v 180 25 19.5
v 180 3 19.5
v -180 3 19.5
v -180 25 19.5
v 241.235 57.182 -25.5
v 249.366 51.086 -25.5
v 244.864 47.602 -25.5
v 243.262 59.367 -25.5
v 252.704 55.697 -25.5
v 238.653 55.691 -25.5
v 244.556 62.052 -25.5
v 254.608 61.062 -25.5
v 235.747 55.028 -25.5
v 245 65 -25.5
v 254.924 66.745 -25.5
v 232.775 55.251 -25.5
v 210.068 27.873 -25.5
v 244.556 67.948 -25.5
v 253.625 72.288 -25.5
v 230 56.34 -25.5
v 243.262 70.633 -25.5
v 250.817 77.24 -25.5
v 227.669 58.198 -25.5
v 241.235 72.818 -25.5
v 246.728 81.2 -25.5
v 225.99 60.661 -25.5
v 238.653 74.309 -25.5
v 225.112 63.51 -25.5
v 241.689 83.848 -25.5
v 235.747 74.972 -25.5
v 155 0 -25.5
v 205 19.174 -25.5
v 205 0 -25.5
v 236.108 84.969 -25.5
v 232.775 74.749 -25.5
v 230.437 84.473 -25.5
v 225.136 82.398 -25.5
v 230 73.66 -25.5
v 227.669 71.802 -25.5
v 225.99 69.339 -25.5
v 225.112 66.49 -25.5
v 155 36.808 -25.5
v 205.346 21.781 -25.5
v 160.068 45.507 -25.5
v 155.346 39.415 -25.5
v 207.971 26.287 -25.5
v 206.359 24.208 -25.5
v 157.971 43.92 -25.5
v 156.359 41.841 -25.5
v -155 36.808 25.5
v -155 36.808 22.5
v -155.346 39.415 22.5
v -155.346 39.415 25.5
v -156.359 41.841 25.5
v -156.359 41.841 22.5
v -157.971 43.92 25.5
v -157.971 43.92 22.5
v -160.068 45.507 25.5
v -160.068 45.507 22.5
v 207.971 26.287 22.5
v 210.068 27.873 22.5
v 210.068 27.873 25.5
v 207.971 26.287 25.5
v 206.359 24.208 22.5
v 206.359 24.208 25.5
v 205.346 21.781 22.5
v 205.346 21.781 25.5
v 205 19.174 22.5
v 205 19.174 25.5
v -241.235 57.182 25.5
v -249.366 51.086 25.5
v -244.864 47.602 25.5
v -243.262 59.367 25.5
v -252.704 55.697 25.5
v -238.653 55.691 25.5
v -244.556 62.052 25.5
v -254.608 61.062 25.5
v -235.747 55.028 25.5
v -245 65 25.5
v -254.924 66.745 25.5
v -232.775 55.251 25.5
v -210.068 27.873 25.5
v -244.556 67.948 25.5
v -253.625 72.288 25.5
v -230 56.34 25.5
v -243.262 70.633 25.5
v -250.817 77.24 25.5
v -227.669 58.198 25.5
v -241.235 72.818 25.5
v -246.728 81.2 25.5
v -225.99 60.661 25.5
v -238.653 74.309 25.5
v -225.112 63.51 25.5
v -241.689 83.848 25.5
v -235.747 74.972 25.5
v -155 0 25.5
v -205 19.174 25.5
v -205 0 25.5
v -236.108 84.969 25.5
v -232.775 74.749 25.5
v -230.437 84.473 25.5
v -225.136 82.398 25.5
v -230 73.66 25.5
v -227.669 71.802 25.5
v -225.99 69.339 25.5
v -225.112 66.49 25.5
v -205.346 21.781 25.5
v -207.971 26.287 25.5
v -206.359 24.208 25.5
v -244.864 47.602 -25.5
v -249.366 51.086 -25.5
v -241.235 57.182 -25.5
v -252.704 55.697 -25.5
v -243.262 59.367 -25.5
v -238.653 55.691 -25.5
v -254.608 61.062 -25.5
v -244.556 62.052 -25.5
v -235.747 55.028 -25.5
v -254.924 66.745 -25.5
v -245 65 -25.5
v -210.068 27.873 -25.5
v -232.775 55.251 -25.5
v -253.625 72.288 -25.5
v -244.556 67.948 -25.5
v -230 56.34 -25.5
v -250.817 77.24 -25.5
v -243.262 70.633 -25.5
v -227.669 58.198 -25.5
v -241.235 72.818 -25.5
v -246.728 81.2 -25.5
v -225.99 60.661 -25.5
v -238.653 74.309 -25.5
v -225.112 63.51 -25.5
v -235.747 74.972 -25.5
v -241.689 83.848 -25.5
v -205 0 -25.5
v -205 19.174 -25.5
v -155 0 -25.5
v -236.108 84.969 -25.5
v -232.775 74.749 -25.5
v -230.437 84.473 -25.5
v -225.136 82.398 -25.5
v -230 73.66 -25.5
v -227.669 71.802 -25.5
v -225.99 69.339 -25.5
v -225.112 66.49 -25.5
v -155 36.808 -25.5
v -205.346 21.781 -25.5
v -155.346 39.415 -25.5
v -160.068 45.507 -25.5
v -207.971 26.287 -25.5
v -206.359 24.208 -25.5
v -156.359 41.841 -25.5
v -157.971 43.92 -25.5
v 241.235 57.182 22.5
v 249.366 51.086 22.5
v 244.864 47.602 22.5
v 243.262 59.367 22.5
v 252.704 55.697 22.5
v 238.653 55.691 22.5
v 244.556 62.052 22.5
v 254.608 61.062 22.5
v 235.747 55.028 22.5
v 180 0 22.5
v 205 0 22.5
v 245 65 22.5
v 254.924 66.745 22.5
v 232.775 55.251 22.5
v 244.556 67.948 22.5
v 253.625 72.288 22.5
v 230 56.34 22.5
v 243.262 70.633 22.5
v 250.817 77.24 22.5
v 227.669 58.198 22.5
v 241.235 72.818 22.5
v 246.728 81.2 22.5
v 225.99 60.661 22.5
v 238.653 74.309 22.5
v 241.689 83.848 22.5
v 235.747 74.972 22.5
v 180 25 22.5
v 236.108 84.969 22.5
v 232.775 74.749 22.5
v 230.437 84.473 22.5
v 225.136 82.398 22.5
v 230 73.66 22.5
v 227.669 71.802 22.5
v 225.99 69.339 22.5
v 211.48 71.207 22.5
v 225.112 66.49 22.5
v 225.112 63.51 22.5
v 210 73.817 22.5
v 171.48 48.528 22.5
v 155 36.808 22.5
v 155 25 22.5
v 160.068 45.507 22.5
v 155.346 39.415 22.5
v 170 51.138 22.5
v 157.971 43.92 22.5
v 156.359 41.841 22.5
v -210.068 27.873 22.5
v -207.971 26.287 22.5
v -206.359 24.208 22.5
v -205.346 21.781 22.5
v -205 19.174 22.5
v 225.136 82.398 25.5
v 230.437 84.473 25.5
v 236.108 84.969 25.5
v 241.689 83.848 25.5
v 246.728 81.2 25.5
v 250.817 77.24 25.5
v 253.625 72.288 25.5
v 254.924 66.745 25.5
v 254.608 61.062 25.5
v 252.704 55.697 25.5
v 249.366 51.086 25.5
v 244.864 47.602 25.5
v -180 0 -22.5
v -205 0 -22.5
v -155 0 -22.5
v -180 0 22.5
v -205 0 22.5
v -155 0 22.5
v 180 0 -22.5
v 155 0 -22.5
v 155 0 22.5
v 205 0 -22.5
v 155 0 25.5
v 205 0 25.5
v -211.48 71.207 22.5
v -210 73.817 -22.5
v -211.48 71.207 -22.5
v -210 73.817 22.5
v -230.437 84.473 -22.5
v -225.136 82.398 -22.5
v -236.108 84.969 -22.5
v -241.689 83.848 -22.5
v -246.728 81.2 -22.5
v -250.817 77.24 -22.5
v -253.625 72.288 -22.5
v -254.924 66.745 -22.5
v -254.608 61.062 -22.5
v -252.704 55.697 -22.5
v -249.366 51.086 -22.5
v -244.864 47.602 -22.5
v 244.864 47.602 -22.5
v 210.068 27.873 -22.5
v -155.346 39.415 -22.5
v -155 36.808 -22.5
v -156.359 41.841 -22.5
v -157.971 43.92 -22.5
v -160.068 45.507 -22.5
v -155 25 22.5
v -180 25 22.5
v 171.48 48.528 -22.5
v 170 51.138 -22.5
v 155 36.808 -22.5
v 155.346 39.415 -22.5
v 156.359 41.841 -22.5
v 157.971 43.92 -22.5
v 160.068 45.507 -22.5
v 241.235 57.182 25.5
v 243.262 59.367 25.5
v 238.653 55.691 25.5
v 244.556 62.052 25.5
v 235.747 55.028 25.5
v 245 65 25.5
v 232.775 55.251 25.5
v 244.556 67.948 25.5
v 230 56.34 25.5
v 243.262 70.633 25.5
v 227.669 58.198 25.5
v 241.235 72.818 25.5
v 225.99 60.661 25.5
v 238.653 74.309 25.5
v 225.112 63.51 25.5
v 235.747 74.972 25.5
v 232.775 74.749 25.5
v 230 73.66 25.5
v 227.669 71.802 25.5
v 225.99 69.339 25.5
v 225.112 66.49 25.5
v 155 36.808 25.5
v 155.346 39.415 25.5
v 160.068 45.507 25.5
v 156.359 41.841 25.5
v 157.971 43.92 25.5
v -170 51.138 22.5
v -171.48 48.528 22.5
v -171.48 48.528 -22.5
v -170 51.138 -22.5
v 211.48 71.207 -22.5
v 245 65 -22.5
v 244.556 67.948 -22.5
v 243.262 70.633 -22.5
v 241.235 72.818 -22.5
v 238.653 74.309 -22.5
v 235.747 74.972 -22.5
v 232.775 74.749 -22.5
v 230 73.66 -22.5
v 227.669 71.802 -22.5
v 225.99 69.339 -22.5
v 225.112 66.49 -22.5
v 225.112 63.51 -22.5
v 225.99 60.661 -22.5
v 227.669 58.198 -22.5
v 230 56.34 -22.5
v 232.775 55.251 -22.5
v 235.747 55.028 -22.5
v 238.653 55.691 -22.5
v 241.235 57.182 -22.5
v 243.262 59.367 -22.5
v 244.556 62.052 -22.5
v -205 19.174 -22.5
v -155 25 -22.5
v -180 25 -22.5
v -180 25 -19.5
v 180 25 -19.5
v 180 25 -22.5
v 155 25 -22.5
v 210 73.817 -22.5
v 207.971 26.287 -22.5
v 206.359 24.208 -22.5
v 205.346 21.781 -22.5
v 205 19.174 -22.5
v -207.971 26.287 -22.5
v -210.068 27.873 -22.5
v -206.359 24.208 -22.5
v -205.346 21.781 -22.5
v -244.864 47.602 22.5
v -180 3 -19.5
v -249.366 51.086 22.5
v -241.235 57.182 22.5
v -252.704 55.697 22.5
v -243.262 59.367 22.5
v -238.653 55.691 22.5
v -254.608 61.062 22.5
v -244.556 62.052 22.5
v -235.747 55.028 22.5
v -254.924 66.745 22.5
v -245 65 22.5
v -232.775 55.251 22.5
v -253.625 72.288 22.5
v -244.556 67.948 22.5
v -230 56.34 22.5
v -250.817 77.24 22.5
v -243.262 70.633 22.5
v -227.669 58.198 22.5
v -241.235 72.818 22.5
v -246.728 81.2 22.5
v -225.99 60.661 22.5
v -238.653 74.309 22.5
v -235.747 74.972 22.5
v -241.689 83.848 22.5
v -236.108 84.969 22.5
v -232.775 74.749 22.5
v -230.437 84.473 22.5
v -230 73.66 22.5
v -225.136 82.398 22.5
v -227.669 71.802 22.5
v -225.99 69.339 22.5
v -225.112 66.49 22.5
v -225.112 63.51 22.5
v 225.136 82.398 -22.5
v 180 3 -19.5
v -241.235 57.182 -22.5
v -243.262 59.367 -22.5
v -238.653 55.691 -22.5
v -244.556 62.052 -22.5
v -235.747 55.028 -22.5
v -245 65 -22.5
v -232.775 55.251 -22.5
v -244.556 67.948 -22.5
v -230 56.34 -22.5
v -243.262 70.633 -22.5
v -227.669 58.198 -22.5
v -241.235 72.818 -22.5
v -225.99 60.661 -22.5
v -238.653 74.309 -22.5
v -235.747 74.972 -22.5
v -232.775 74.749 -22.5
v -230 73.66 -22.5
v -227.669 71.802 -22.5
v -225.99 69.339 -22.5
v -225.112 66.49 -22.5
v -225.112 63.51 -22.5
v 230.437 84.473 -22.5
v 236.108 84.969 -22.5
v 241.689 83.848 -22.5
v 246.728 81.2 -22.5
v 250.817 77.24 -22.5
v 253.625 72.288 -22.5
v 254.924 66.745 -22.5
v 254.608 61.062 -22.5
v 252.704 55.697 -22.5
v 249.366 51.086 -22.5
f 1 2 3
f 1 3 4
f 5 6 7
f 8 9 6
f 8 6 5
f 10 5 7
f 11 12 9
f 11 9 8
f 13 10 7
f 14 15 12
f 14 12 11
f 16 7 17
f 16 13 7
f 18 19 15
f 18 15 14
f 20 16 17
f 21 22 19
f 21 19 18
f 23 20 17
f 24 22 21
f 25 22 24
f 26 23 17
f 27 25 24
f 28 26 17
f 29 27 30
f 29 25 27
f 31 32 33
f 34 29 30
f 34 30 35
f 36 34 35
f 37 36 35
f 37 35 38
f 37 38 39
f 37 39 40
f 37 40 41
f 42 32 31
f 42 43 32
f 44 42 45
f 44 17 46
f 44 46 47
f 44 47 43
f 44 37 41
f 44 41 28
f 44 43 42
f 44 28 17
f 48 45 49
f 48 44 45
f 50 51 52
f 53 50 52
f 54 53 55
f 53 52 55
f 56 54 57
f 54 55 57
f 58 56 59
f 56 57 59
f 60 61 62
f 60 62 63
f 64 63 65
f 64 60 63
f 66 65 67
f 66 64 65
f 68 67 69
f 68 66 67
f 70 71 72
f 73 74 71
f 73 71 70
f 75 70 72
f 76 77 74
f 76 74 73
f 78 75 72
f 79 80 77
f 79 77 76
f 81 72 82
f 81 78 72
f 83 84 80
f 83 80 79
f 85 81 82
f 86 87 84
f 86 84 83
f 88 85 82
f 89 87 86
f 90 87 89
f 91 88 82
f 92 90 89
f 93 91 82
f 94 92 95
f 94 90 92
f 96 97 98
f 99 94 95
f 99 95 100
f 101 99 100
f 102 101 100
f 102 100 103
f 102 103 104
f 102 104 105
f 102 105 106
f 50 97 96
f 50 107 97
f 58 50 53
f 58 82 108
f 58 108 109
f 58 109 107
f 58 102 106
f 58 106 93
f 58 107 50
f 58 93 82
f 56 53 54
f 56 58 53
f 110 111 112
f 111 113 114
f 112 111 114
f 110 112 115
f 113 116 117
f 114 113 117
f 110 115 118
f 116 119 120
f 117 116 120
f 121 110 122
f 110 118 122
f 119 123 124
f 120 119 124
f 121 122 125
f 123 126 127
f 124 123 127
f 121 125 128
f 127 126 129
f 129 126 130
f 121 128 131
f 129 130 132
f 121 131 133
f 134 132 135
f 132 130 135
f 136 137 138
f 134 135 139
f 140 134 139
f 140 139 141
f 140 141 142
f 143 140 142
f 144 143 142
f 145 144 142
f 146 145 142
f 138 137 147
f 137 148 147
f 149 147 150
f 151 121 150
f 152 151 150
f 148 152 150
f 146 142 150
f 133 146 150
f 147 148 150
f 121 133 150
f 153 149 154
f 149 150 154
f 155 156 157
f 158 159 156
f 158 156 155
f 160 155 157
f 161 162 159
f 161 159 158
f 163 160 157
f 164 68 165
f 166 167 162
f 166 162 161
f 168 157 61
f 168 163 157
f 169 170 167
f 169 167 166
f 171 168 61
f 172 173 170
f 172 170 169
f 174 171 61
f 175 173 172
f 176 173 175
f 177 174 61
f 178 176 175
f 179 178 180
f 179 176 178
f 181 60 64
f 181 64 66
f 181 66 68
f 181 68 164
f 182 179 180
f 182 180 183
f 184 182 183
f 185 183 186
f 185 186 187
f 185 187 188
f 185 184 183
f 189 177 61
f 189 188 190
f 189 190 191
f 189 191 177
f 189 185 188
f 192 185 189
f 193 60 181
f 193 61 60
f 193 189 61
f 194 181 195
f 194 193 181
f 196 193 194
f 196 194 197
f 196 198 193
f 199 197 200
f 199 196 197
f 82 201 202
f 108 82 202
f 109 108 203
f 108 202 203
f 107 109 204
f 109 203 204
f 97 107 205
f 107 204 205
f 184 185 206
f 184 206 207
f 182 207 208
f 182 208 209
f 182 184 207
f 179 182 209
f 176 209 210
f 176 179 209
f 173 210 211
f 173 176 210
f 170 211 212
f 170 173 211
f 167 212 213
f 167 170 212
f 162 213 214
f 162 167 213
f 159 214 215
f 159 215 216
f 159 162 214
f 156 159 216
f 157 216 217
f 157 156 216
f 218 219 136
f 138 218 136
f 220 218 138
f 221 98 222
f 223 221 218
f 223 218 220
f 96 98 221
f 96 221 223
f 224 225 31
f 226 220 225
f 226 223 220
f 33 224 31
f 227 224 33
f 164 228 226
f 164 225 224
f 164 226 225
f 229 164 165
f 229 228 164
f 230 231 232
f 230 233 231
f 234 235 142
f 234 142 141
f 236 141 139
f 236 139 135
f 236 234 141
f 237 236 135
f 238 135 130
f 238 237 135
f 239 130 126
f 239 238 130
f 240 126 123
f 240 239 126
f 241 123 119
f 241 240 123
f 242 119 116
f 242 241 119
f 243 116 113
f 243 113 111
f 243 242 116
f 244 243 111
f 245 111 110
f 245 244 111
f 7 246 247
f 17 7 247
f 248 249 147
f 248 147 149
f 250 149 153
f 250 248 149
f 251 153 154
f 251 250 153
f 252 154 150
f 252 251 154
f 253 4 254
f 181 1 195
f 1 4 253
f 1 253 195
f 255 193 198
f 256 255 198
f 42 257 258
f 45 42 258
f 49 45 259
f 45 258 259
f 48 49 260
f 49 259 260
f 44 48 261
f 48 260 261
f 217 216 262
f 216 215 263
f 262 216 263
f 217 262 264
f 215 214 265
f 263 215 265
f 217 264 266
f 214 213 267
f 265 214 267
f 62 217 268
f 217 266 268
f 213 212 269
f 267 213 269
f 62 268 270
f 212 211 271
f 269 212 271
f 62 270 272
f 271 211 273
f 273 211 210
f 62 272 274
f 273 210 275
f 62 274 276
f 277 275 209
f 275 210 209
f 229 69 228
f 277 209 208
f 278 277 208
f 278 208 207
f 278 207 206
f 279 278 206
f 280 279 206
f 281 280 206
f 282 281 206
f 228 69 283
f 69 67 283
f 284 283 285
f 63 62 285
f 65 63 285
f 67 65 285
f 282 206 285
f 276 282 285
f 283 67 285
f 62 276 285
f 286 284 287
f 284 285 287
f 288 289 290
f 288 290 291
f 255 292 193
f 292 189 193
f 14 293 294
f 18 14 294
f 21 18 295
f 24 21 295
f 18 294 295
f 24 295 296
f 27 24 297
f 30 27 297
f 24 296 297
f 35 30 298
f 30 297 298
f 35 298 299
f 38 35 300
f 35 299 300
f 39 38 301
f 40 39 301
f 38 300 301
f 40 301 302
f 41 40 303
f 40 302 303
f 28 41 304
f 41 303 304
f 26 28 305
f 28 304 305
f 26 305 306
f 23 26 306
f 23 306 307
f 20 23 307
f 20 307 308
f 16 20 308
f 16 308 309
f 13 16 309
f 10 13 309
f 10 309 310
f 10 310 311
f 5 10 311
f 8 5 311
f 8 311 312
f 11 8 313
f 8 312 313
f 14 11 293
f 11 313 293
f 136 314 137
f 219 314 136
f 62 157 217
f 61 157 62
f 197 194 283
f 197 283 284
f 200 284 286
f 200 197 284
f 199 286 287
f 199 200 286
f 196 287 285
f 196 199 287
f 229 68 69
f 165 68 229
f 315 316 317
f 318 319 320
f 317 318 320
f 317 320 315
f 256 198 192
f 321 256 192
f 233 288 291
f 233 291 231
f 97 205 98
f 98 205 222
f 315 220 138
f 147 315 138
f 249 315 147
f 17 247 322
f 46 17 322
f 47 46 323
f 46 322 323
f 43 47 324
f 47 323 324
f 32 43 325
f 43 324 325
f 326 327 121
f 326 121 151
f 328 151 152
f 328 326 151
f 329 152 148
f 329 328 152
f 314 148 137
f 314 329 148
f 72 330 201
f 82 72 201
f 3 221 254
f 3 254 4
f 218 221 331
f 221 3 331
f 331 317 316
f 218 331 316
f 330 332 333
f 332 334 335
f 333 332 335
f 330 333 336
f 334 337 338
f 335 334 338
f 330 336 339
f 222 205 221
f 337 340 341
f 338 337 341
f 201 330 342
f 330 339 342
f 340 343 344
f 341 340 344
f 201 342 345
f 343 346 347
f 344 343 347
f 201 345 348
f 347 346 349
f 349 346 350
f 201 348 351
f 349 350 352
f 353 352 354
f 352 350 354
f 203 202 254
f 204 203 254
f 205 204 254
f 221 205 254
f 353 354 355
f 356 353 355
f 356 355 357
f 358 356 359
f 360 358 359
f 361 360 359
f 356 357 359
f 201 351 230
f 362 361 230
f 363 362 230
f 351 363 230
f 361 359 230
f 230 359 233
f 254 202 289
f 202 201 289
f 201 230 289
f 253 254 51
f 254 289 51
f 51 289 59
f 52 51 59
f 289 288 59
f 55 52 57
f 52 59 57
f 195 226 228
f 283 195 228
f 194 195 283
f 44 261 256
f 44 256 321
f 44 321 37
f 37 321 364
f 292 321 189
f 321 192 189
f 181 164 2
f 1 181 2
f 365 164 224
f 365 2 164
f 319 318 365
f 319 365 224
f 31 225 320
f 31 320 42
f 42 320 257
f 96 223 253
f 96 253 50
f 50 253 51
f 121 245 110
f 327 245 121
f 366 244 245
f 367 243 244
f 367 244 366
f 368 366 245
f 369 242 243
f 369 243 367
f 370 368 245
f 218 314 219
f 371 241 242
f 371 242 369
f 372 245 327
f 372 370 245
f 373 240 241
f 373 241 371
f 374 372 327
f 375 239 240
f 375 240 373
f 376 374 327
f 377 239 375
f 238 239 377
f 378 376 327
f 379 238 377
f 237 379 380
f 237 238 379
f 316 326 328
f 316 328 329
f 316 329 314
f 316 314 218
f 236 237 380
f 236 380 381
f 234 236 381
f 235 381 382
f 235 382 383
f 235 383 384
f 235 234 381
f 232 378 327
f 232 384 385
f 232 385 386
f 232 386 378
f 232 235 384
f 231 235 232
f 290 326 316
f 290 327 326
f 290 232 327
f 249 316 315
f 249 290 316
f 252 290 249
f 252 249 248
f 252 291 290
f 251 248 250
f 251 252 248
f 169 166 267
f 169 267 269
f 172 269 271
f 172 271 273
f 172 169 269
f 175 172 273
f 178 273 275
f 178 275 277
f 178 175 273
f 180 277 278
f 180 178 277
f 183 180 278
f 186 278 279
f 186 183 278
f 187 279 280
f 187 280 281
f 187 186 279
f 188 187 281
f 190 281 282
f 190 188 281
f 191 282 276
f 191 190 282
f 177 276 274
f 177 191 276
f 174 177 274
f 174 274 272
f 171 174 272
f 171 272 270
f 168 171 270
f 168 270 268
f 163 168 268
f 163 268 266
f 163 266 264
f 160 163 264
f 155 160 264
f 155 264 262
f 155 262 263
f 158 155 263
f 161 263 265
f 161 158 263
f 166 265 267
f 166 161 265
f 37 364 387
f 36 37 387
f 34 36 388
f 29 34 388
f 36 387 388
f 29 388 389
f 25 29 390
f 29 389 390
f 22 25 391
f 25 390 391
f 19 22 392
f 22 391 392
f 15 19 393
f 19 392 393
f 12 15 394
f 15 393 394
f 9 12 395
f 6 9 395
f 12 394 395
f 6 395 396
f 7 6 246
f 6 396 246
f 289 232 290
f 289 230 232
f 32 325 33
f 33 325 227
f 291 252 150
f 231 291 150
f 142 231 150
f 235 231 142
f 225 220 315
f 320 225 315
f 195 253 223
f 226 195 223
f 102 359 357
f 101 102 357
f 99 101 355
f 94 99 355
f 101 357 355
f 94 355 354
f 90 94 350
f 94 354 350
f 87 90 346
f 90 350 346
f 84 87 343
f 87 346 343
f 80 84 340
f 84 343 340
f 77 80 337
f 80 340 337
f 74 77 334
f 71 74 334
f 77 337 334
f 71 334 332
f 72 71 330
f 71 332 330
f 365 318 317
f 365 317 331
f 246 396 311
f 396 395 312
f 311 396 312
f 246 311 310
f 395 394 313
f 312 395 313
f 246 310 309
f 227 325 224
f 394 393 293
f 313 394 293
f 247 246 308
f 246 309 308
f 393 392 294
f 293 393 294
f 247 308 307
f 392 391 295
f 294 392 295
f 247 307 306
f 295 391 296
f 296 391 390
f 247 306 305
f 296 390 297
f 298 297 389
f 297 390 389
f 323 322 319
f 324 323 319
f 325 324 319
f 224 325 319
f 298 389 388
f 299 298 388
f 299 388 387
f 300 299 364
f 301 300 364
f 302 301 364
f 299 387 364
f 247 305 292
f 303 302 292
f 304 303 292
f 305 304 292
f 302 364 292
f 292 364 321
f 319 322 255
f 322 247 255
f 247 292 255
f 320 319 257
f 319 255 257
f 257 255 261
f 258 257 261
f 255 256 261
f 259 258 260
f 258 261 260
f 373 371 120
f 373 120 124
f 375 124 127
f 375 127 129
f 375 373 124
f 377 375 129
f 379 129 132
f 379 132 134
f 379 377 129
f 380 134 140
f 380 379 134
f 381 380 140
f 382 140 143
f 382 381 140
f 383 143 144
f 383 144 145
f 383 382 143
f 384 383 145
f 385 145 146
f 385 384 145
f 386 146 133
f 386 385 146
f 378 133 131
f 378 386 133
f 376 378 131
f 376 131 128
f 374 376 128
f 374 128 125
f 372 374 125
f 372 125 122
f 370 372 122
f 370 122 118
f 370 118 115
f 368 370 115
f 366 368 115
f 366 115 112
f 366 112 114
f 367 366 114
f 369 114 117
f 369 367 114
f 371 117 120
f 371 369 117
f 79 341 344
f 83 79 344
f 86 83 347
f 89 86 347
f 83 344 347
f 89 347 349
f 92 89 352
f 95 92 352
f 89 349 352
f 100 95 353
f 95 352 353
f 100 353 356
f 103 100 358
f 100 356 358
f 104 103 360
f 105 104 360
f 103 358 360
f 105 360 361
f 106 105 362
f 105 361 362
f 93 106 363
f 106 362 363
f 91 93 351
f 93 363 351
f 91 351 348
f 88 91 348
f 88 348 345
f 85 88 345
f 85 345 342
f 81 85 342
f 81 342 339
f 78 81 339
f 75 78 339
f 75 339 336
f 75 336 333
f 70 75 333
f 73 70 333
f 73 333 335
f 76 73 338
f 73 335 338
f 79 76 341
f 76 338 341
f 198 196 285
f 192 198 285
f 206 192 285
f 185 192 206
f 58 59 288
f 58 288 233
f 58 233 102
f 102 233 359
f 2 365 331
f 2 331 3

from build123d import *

# Parameters (mm, degrees)
EXTRUDE_1_DEPTH          = 180
SKETCH_2_R               = 10
EXTRUDE_2_DEPTH          = 3
EXTRUDE_3_DEPTH          = 22.5
MIRROR_2_COPY_1_SKETCH_R = 10
MIRROR_2_COPY_1_DEPTH    = 3


with BuildPart() as part:
    # 스케치1 → 보스-돌출1 (new, symmetric)
    with BuildSketch(Plane(origin=(0, 0, 0), x_dir=(0, 0, -1), z_dir=(1, 0, 0))):
        Polygon((22.5, 0), (22.5, 25), (19.5, 25), (19.5, 3), (-19.5, 3), (-19.5, 25), (-22.5, 25), (-22.5, 0), align=None)
    extrude(amount=EXTRUDE_1_DEPTH, both=True)

    # 스케치2 → 보스-돌출2 (add)
    with BuildSketch(Plane.XY.offset(22.5)):
        with BuildLine():
            Line((155, 0), (155, 36.807573628))
            ThreePointArc((155, 36.807573628), (156.359363128, 41.841398659), (160.067878888, 45.506664462))
            Line((160.067878888, 45.506664462), (225.135757776, 82.398181668))
            ThreePointArc((225.135757776, 82.398181668), (252.398181668, 74.864242224), (244.864242224, 47.601818332))
            Line((244.864242224, 47.601818332), (210.067878888, 27.873333884))
            ThreePointArc((210.067878888, 27.873333884), (206.359363128, 24.208068081), (205, 19.17424305))
            Line((205, 19.17424305), (205, 0))
            Line((205, 0), (155, 0))
        make_face()
        with Locations((235, 65)):
            Circle(SKETCH_2_R, mode=Mode.SUBTRACT)
    extrude_2 = extrude(amount=EXTRUDE_2_DEPTH)

    # 대칭 복사1: 보스-돌출2 across plane
    add(extrude_2.mirror(Plane.XY))

    # 스케치4 → 보스-돌출3 (add, symmetric)
    with BuildSketch(Plane.XY):
        Polygon((170, 51.137876408), (210, 73.816665289), (211.479636334, 71.206938039), (171.479636334, 48.528149158), align=None)
    extrude_3 = extrude(amount=EXTRUDE_3_DEPTH, both=True)

    # 대칭 복사2: 보스-돌출2, 보스-돌출3 across plane
    add(extrude_2.mirror(Plane(origin=(0, 0, 0), x_dir=(0, 0, 1), z_dir=(1, 0, 0))))
    add(extrude_3.mirror(Plane(origin=(0, 0, 0), x_dir=(0, 0, 1), z_dir=(1, 0, 0))))

    # 대칭 복사2 copy 1 sketch → 대칭 복사2 copy 1 (add)
    with BuildSketch(Plane(origin=(0, 0, -22.5), x_dir=(-1, 0, 0), z_dir=(0, 0, -1))):
        with BuildLine():
            Line((155, 0), (155, 36.807573628))
            ThreePointArc((155, 36.807573628), (156.359363128, 41.841398659), (160.067878888, 45.506664462))
            Line((160.067878888, 45.506664462), (225.135757776, 82.398181668))
            ThreePointArc((225.135757776, 82.398181668), (252.398181668, 74.864242224), (244.864242224, 47.601818332))
            Line((244.864242224, 47.601818332), (210.067878888, 27.873333884))
            ThreePointArc((210.067878888, 27.873333884), (206.359363128, 24.208068081), (205, 19.17424305))
            Line((205, 19.17424305), (205, 0))
            Line((205, 0), (155, 0))
        make_face()
        with Locations((235, 65)):
            Circle(MIRROR_2_COPY_1_SKETCH_R, mode=Mode.SUBTRACT)
    extrude(amount=MIRROR_2_COPY_1_DEPTH)


solid = part.part
